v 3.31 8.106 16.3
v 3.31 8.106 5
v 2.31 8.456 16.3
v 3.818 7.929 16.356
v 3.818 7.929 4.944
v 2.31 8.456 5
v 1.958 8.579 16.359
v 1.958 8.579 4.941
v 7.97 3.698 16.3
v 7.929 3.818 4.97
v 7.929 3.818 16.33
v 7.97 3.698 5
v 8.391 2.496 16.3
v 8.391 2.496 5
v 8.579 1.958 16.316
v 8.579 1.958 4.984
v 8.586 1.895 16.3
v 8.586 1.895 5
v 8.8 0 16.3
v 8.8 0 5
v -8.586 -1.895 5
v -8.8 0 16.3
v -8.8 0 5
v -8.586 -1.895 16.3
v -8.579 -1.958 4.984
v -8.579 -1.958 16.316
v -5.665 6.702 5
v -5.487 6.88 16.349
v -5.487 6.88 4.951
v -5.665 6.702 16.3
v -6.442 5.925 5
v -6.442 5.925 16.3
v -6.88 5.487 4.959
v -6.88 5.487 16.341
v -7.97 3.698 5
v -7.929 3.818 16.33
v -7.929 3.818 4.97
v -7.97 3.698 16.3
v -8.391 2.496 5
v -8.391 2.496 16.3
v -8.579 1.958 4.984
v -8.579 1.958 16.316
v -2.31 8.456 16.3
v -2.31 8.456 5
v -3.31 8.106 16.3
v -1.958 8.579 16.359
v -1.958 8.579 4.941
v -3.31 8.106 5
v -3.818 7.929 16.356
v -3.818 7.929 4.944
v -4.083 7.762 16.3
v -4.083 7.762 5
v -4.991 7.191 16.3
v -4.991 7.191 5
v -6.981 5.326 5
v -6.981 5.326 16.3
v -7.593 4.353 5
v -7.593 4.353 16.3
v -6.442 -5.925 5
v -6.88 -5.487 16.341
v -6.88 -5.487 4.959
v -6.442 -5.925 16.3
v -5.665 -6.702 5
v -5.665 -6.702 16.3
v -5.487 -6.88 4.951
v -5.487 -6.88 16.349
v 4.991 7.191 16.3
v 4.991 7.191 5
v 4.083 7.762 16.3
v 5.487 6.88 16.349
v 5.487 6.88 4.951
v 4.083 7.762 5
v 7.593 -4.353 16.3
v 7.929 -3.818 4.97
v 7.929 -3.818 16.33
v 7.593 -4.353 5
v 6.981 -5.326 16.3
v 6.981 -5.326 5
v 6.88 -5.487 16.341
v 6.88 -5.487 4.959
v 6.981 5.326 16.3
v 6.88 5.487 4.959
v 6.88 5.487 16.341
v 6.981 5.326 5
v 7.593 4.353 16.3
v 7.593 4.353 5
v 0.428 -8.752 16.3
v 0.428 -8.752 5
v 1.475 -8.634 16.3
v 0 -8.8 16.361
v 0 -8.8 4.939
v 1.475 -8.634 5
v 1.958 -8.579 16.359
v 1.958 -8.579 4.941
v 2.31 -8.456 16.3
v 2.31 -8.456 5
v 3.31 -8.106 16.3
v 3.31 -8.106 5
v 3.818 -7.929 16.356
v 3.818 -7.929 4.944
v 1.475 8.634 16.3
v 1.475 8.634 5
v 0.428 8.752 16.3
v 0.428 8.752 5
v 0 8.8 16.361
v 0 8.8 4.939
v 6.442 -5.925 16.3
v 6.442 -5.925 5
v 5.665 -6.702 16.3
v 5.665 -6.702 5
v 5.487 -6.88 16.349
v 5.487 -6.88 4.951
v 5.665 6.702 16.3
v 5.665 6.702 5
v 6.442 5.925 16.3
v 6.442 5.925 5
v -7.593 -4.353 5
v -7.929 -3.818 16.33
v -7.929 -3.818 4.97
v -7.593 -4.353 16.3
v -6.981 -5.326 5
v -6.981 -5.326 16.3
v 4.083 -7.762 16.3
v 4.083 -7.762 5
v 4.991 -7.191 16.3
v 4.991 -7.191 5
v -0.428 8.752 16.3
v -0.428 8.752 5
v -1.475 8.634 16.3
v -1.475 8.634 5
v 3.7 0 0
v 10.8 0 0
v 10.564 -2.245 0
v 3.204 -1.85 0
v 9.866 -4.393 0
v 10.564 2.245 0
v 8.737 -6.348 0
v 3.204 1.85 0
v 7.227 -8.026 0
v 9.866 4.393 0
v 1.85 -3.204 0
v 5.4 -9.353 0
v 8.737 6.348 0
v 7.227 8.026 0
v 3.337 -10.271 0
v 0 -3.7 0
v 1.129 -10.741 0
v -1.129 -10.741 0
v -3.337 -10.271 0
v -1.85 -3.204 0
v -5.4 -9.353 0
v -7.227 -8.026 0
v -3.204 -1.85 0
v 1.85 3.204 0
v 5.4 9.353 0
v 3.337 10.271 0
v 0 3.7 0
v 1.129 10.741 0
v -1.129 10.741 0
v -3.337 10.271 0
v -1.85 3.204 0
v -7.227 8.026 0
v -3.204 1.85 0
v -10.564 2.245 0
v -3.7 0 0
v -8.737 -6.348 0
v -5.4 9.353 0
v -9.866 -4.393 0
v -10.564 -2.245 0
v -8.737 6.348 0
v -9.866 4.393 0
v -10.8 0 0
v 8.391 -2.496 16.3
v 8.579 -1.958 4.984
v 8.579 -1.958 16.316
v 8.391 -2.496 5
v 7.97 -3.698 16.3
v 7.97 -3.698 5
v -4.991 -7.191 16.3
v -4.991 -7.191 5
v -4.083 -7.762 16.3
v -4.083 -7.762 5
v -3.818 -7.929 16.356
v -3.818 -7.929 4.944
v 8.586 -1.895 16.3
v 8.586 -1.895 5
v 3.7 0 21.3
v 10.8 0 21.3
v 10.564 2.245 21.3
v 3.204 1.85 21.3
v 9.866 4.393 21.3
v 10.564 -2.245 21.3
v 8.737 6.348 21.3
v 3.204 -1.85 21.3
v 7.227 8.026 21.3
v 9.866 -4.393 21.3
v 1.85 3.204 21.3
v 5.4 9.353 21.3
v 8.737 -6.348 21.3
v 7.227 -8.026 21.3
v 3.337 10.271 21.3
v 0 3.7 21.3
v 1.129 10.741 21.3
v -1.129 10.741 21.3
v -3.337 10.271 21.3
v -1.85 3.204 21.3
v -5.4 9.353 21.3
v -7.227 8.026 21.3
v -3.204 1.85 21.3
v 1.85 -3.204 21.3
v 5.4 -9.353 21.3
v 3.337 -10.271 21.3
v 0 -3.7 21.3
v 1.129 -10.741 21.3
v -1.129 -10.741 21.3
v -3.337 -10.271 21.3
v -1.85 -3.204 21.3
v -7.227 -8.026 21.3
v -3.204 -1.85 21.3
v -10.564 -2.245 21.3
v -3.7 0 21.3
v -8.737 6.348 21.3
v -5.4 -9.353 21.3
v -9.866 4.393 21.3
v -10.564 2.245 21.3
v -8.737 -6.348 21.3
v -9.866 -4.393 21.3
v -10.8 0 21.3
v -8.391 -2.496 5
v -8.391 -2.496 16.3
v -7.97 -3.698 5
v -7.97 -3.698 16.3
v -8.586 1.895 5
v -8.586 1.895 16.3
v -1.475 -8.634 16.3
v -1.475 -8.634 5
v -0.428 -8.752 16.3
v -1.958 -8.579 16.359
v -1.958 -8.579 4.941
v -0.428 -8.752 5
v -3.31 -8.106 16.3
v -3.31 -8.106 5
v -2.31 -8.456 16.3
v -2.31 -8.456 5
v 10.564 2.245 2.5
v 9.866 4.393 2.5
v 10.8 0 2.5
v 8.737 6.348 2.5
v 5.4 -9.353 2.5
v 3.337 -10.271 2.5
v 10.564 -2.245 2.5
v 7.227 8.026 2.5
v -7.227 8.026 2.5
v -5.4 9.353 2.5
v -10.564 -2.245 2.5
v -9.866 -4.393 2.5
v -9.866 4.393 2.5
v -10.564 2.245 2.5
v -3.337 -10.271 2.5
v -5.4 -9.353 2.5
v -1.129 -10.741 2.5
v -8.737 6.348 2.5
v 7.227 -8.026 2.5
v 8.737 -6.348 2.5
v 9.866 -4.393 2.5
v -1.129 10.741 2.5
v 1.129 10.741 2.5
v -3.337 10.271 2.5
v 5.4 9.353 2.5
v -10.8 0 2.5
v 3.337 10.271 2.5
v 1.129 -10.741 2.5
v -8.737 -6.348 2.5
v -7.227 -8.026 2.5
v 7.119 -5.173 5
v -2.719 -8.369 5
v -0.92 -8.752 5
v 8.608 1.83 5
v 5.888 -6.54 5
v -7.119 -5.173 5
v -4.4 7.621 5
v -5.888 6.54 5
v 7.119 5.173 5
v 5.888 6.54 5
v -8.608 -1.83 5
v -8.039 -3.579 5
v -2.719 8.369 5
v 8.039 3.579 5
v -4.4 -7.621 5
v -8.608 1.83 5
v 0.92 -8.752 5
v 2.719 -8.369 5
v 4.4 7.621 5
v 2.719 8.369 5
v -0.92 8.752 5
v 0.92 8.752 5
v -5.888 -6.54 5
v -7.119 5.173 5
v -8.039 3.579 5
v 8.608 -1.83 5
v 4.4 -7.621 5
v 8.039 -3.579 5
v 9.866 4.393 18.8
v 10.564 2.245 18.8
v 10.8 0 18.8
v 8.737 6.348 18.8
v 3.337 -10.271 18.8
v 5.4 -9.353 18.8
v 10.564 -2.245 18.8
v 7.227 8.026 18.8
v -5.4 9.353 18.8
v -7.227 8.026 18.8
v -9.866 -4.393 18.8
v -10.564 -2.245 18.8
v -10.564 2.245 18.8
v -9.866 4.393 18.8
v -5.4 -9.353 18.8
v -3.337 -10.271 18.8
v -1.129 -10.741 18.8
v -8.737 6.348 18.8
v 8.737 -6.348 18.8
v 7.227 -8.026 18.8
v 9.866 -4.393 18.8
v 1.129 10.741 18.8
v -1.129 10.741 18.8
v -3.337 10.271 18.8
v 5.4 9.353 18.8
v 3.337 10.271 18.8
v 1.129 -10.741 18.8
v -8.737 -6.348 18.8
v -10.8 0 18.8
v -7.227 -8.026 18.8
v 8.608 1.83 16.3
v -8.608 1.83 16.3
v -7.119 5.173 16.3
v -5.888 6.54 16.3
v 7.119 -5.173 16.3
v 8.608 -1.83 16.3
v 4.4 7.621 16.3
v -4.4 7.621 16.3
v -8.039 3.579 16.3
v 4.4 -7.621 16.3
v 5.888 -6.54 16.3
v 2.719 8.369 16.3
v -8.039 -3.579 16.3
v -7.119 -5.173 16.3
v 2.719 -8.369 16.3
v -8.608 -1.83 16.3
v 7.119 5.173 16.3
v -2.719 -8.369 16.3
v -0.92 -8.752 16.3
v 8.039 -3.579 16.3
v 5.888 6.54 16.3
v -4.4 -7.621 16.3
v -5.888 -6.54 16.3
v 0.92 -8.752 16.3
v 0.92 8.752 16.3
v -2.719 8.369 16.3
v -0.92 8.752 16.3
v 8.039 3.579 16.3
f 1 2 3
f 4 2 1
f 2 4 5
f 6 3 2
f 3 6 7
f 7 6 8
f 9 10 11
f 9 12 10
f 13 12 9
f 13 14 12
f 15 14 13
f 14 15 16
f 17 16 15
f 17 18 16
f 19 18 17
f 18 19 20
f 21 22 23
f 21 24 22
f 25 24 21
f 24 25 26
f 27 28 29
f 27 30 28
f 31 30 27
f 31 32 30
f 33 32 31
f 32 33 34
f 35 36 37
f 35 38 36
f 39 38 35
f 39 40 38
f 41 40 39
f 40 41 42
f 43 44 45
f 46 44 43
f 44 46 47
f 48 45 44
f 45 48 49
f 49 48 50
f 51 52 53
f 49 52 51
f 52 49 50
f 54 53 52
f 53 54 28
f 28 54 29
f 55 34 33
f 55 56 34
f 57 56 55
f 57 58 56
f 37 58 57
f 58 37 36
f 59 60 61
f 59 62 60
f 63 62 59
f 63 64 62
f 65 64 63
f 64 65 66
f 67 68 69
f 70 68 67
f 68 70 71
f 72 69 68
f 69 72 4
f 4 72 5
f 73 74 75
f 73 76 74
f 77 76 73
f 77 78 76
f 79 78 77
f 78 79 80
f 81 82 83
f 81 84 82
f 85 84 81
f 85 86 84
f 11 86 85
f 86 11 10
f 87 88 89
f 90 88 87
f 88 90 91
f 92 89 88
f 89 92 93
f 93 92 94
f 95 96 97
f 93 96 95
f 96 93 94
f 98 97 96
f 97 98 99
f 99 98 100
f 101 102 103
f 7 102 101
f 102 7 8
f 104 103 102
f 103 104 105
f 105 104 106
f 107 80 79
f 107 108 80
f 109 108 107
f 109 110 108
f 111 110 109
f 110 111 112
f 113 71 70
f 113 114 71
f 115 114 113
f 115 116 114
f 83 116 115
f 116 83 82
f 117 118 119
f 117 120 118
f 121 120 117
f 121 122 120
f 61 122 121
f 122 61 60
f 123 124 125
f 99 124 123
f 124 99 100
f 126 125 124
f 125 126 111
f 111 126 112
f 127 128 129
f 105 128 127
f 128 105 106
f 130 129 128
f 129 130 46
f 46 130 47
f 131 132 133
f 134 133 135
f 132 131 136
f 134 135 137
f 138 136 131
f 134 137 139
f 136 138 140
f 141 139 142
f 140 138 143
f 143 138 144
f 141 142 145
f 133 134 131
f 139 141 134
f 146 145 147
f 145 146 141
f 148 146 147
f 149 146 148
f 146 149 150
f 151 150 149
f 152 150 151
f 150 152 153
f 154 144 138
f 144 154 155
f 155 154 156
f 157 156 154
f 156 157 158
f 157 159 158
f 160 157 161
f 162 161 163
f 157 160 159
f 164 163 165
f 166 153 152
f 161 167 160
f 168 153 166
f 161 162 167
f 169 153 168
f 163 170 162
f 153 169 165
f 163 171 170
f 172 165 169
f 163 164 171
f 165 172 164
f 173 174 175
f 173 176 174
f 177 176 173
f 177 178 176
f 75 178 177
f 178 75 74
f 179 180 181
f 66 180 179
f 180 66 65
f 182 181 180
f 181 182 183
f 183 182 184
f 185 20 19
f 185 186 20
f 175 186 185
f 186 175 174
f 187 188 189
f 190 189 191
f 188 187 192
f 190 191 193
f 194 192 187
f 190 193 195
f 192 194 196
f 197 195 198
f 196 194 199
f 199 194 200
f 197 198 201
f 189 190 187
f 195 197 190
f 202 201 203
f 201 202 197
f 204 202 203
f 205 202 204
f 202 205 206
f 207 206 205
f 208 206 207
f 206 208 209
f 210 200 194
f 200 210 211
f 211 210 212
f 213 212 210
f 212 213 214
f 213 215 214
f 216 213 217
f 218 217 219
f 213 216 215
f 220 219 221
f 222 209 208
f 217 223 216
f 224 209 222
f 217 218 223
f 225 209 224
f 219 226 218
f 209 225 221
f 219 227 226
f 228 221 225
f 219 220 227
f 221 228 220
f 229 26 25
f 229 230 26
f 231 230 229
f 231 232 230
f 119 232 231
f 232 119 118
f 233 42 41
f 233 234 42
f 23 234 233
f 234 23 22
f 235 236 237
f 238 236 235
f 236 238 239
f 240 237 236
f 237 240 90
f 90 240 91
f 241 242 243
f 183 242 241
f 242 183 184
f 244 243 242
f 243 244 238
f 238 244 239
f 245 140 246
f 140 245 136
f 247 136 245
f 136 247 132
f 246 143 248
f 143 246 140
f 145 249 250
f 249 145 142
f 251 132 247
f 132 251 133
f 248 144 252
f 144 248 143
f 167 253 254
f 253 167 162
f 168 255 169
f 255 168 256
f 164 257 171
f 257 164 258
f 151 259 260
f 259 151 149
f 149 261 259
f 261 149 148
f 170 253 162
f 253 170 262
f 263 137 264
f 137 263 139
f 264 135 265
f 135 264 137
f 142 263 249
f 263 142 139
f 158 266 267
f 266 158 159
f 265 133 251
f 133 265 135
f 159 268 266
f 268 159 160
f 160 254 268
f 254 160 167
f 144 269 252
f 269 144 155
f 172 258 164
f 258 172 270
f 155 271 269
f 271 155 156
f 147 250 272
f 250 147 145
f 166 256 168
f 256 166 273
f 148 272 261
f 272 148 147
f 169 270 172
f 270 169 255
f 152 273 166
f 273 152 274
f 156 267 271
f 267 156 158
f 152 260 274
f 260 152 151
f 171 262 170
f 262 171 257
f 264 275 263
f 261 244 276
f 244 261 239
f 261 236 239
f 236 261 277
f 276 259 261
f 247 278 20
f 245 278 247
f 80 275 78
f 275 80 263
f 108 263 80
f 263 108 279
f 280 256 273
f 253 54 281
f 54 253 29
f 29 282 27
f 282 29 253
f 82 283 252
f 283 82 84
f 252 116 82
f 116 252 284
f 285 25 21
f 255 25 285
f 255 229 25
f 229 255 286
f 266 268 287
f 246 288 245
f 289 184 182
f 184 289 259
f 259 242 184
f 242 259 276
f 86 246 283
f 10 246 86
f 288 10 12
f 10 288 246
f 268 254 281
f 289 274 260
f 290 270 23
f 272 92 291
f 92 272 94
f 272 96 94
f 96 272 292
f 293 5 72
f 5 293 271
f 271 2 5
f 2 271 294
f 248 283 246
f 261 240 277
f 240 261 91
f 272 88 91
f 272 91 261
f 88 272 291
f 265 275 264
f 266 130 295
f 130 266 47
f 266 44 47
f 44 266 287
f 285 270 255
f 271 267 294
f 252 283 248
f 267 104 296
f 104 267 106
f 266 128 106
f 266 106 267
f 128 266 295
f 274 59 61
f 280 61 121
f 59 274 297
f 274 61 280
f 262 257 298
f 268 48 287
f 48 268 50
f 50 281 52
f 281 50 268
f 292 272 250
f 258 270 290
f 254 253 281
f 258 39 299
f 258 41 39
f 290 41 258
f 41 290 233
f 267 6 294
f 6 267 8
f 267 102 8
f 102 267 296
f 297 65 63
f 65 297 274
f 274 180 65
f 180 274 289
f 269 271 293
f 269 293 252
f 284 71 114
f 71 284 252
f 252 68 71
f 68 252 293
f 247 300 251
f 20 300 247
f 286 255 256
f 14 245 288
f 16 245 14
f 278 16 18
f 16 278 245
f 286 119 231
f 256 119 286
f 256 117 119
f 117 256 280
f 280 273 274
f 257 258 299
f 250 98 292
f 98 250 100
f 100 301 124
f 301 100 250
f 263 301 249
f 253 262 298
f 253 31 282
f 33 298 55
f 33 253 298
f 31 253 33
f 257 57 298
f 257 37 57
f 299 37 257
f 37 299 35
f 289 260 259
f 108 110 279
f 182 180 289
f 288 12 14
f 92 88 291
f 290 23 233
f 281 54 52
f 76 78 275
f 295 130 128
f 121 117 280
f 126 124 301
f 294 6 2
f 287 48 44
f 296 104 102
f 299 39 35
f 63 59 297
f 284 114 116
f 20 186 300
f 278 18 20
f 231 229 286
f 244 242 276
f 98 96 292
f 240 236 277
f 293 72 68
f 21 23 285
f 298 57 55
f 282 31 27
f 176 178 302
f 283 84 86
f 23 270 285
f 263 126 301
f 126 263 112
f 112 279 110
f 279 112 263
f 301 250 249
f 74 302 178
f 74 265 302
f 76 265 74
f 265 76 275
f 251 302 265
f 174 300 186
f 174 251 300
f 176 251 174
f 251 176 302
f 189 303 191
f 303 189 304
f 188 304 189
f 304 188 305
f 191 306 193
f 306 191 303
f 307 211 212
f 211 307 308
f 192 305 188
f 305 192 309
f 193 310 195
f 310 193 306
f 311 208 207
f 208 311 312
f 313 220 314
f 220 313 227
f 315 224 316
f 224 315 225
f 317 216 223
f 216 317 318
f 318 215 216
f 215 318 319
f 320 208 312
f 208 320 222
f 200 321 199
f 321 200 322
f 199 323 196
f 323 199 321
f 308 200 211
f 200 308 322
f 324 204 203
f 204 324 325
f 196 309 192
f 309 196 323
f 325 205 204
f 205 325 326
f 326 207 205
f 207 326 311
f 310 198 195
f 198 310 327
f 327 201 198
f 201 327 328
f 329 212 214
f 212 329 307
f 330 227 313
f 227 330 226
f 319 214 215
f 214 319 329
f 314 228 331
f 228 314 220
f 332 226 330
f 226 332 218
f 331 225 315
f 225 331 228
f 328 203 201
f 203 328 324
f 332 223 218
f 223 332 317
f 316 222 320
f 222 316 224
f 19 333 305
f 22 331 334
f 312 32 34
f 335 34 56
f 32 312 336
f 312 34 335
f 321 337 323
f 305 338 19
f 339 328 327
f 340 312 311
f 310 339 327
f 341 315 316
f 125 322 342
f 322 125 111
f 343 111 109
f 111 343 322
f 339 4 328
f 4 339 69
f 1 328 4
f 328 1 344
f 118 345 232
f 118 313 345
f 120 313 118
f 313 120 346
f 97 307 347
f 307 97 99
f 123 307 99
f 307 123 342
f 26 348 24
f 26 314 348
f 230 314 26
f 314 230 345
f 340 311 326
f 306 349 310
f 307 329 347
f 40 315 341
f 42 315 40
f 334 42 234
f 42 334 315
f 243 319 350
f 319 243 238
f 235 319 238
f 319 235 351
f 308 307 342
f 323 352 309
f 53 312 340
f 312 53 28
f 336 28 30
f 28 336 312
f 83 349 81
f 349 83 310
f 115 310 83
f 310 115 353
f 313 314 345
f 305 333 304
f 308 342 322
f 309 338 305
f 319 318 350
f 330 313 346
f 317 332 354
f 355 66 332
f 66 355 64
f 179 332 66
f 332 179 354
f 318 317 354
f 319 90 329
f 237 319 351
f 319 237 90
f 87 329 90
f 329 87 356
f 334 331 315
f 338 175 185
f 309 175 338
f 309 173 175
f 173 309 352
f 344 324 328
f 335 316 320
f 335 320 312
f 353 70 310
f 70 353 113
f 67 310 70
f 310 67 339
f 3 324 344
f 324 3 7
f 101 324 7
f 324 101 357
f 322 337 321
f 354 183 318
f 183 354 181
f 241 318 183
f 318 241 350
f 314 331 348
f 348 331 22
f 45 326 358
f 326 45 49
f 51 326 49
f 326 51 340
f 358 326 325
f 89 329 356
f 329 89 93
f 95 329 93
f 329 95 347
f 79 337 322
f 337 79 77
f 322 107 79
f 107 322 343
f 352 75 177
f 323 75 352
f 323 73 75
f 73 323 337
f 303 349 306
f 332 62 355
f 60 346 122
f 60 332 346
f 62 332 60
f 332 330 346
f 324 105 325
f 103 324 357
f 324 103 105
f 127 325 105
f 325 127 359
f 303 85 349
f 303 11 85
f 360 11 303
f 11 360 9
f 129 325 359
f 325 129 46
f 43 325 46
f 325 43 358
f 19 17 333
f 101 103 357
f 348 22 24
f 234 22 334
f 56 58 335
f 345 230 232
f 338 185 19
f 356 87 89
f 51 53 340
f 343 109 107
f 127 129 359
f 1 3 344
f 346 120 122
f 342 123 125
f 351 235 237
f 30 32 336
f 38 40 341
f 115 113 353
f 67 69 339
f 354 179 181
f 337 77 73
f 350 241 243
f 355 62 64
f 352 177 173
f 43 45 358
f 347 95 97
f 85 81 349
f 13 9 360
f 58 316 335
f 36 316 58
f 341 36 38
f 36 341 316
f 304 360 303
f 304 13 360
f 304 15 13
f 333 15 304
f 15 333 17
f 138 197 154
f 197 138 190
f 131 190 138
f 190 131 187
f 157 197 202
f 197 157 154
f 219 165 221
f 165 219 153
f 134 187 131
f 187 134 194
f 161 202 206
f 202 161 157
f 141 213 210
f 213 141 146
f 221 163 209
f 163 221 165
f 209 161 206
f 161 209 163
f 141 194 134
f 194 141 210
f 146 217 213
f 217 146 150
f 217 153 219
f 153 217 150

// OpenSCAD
/*
Create a thread spool
Created by Mike Creuzer - Mike@Creuzer.com 20120820
Updated 1/14/2013 for Customizer optimization
*/

// Parameters are in mm

// The radius of the spool (half the diameter)
spool_radius = 8.8; // 17.6 / 2 for the toy I used
// The height of the spool
spool_height = 21.3;

// The top and bottom radius
lip_radius = 10.8; // 21.6 / 2 for the toy I used
// The height of the top and bottom
lip_height = 2.5;

// The radius of the whole in the center
spindle_radius = 3.7; // 7.4/2


difference()
{
	union() // Make the spool
	{
		cylinder(r=spool_radius, h=spool_height);
		cylinder(r=lip_radius, h=lip_height);
		translate([0,0,lip_height]) cylinder(r1=lip_radius, r2 = spool_radius, h=lip_height);
		translate([0,0,spool_height-lip_height]) cylinder(r=lip_radius, h=lip_height);
		translate([0,0,spool_height-lip_height-lip_height]) cylinder(r2=lip_radius, r1 = spool_radius, h=lip_height);
	}
	cylinder(r=spindle_radius, h=spool_height); // The hole down the middle
}
